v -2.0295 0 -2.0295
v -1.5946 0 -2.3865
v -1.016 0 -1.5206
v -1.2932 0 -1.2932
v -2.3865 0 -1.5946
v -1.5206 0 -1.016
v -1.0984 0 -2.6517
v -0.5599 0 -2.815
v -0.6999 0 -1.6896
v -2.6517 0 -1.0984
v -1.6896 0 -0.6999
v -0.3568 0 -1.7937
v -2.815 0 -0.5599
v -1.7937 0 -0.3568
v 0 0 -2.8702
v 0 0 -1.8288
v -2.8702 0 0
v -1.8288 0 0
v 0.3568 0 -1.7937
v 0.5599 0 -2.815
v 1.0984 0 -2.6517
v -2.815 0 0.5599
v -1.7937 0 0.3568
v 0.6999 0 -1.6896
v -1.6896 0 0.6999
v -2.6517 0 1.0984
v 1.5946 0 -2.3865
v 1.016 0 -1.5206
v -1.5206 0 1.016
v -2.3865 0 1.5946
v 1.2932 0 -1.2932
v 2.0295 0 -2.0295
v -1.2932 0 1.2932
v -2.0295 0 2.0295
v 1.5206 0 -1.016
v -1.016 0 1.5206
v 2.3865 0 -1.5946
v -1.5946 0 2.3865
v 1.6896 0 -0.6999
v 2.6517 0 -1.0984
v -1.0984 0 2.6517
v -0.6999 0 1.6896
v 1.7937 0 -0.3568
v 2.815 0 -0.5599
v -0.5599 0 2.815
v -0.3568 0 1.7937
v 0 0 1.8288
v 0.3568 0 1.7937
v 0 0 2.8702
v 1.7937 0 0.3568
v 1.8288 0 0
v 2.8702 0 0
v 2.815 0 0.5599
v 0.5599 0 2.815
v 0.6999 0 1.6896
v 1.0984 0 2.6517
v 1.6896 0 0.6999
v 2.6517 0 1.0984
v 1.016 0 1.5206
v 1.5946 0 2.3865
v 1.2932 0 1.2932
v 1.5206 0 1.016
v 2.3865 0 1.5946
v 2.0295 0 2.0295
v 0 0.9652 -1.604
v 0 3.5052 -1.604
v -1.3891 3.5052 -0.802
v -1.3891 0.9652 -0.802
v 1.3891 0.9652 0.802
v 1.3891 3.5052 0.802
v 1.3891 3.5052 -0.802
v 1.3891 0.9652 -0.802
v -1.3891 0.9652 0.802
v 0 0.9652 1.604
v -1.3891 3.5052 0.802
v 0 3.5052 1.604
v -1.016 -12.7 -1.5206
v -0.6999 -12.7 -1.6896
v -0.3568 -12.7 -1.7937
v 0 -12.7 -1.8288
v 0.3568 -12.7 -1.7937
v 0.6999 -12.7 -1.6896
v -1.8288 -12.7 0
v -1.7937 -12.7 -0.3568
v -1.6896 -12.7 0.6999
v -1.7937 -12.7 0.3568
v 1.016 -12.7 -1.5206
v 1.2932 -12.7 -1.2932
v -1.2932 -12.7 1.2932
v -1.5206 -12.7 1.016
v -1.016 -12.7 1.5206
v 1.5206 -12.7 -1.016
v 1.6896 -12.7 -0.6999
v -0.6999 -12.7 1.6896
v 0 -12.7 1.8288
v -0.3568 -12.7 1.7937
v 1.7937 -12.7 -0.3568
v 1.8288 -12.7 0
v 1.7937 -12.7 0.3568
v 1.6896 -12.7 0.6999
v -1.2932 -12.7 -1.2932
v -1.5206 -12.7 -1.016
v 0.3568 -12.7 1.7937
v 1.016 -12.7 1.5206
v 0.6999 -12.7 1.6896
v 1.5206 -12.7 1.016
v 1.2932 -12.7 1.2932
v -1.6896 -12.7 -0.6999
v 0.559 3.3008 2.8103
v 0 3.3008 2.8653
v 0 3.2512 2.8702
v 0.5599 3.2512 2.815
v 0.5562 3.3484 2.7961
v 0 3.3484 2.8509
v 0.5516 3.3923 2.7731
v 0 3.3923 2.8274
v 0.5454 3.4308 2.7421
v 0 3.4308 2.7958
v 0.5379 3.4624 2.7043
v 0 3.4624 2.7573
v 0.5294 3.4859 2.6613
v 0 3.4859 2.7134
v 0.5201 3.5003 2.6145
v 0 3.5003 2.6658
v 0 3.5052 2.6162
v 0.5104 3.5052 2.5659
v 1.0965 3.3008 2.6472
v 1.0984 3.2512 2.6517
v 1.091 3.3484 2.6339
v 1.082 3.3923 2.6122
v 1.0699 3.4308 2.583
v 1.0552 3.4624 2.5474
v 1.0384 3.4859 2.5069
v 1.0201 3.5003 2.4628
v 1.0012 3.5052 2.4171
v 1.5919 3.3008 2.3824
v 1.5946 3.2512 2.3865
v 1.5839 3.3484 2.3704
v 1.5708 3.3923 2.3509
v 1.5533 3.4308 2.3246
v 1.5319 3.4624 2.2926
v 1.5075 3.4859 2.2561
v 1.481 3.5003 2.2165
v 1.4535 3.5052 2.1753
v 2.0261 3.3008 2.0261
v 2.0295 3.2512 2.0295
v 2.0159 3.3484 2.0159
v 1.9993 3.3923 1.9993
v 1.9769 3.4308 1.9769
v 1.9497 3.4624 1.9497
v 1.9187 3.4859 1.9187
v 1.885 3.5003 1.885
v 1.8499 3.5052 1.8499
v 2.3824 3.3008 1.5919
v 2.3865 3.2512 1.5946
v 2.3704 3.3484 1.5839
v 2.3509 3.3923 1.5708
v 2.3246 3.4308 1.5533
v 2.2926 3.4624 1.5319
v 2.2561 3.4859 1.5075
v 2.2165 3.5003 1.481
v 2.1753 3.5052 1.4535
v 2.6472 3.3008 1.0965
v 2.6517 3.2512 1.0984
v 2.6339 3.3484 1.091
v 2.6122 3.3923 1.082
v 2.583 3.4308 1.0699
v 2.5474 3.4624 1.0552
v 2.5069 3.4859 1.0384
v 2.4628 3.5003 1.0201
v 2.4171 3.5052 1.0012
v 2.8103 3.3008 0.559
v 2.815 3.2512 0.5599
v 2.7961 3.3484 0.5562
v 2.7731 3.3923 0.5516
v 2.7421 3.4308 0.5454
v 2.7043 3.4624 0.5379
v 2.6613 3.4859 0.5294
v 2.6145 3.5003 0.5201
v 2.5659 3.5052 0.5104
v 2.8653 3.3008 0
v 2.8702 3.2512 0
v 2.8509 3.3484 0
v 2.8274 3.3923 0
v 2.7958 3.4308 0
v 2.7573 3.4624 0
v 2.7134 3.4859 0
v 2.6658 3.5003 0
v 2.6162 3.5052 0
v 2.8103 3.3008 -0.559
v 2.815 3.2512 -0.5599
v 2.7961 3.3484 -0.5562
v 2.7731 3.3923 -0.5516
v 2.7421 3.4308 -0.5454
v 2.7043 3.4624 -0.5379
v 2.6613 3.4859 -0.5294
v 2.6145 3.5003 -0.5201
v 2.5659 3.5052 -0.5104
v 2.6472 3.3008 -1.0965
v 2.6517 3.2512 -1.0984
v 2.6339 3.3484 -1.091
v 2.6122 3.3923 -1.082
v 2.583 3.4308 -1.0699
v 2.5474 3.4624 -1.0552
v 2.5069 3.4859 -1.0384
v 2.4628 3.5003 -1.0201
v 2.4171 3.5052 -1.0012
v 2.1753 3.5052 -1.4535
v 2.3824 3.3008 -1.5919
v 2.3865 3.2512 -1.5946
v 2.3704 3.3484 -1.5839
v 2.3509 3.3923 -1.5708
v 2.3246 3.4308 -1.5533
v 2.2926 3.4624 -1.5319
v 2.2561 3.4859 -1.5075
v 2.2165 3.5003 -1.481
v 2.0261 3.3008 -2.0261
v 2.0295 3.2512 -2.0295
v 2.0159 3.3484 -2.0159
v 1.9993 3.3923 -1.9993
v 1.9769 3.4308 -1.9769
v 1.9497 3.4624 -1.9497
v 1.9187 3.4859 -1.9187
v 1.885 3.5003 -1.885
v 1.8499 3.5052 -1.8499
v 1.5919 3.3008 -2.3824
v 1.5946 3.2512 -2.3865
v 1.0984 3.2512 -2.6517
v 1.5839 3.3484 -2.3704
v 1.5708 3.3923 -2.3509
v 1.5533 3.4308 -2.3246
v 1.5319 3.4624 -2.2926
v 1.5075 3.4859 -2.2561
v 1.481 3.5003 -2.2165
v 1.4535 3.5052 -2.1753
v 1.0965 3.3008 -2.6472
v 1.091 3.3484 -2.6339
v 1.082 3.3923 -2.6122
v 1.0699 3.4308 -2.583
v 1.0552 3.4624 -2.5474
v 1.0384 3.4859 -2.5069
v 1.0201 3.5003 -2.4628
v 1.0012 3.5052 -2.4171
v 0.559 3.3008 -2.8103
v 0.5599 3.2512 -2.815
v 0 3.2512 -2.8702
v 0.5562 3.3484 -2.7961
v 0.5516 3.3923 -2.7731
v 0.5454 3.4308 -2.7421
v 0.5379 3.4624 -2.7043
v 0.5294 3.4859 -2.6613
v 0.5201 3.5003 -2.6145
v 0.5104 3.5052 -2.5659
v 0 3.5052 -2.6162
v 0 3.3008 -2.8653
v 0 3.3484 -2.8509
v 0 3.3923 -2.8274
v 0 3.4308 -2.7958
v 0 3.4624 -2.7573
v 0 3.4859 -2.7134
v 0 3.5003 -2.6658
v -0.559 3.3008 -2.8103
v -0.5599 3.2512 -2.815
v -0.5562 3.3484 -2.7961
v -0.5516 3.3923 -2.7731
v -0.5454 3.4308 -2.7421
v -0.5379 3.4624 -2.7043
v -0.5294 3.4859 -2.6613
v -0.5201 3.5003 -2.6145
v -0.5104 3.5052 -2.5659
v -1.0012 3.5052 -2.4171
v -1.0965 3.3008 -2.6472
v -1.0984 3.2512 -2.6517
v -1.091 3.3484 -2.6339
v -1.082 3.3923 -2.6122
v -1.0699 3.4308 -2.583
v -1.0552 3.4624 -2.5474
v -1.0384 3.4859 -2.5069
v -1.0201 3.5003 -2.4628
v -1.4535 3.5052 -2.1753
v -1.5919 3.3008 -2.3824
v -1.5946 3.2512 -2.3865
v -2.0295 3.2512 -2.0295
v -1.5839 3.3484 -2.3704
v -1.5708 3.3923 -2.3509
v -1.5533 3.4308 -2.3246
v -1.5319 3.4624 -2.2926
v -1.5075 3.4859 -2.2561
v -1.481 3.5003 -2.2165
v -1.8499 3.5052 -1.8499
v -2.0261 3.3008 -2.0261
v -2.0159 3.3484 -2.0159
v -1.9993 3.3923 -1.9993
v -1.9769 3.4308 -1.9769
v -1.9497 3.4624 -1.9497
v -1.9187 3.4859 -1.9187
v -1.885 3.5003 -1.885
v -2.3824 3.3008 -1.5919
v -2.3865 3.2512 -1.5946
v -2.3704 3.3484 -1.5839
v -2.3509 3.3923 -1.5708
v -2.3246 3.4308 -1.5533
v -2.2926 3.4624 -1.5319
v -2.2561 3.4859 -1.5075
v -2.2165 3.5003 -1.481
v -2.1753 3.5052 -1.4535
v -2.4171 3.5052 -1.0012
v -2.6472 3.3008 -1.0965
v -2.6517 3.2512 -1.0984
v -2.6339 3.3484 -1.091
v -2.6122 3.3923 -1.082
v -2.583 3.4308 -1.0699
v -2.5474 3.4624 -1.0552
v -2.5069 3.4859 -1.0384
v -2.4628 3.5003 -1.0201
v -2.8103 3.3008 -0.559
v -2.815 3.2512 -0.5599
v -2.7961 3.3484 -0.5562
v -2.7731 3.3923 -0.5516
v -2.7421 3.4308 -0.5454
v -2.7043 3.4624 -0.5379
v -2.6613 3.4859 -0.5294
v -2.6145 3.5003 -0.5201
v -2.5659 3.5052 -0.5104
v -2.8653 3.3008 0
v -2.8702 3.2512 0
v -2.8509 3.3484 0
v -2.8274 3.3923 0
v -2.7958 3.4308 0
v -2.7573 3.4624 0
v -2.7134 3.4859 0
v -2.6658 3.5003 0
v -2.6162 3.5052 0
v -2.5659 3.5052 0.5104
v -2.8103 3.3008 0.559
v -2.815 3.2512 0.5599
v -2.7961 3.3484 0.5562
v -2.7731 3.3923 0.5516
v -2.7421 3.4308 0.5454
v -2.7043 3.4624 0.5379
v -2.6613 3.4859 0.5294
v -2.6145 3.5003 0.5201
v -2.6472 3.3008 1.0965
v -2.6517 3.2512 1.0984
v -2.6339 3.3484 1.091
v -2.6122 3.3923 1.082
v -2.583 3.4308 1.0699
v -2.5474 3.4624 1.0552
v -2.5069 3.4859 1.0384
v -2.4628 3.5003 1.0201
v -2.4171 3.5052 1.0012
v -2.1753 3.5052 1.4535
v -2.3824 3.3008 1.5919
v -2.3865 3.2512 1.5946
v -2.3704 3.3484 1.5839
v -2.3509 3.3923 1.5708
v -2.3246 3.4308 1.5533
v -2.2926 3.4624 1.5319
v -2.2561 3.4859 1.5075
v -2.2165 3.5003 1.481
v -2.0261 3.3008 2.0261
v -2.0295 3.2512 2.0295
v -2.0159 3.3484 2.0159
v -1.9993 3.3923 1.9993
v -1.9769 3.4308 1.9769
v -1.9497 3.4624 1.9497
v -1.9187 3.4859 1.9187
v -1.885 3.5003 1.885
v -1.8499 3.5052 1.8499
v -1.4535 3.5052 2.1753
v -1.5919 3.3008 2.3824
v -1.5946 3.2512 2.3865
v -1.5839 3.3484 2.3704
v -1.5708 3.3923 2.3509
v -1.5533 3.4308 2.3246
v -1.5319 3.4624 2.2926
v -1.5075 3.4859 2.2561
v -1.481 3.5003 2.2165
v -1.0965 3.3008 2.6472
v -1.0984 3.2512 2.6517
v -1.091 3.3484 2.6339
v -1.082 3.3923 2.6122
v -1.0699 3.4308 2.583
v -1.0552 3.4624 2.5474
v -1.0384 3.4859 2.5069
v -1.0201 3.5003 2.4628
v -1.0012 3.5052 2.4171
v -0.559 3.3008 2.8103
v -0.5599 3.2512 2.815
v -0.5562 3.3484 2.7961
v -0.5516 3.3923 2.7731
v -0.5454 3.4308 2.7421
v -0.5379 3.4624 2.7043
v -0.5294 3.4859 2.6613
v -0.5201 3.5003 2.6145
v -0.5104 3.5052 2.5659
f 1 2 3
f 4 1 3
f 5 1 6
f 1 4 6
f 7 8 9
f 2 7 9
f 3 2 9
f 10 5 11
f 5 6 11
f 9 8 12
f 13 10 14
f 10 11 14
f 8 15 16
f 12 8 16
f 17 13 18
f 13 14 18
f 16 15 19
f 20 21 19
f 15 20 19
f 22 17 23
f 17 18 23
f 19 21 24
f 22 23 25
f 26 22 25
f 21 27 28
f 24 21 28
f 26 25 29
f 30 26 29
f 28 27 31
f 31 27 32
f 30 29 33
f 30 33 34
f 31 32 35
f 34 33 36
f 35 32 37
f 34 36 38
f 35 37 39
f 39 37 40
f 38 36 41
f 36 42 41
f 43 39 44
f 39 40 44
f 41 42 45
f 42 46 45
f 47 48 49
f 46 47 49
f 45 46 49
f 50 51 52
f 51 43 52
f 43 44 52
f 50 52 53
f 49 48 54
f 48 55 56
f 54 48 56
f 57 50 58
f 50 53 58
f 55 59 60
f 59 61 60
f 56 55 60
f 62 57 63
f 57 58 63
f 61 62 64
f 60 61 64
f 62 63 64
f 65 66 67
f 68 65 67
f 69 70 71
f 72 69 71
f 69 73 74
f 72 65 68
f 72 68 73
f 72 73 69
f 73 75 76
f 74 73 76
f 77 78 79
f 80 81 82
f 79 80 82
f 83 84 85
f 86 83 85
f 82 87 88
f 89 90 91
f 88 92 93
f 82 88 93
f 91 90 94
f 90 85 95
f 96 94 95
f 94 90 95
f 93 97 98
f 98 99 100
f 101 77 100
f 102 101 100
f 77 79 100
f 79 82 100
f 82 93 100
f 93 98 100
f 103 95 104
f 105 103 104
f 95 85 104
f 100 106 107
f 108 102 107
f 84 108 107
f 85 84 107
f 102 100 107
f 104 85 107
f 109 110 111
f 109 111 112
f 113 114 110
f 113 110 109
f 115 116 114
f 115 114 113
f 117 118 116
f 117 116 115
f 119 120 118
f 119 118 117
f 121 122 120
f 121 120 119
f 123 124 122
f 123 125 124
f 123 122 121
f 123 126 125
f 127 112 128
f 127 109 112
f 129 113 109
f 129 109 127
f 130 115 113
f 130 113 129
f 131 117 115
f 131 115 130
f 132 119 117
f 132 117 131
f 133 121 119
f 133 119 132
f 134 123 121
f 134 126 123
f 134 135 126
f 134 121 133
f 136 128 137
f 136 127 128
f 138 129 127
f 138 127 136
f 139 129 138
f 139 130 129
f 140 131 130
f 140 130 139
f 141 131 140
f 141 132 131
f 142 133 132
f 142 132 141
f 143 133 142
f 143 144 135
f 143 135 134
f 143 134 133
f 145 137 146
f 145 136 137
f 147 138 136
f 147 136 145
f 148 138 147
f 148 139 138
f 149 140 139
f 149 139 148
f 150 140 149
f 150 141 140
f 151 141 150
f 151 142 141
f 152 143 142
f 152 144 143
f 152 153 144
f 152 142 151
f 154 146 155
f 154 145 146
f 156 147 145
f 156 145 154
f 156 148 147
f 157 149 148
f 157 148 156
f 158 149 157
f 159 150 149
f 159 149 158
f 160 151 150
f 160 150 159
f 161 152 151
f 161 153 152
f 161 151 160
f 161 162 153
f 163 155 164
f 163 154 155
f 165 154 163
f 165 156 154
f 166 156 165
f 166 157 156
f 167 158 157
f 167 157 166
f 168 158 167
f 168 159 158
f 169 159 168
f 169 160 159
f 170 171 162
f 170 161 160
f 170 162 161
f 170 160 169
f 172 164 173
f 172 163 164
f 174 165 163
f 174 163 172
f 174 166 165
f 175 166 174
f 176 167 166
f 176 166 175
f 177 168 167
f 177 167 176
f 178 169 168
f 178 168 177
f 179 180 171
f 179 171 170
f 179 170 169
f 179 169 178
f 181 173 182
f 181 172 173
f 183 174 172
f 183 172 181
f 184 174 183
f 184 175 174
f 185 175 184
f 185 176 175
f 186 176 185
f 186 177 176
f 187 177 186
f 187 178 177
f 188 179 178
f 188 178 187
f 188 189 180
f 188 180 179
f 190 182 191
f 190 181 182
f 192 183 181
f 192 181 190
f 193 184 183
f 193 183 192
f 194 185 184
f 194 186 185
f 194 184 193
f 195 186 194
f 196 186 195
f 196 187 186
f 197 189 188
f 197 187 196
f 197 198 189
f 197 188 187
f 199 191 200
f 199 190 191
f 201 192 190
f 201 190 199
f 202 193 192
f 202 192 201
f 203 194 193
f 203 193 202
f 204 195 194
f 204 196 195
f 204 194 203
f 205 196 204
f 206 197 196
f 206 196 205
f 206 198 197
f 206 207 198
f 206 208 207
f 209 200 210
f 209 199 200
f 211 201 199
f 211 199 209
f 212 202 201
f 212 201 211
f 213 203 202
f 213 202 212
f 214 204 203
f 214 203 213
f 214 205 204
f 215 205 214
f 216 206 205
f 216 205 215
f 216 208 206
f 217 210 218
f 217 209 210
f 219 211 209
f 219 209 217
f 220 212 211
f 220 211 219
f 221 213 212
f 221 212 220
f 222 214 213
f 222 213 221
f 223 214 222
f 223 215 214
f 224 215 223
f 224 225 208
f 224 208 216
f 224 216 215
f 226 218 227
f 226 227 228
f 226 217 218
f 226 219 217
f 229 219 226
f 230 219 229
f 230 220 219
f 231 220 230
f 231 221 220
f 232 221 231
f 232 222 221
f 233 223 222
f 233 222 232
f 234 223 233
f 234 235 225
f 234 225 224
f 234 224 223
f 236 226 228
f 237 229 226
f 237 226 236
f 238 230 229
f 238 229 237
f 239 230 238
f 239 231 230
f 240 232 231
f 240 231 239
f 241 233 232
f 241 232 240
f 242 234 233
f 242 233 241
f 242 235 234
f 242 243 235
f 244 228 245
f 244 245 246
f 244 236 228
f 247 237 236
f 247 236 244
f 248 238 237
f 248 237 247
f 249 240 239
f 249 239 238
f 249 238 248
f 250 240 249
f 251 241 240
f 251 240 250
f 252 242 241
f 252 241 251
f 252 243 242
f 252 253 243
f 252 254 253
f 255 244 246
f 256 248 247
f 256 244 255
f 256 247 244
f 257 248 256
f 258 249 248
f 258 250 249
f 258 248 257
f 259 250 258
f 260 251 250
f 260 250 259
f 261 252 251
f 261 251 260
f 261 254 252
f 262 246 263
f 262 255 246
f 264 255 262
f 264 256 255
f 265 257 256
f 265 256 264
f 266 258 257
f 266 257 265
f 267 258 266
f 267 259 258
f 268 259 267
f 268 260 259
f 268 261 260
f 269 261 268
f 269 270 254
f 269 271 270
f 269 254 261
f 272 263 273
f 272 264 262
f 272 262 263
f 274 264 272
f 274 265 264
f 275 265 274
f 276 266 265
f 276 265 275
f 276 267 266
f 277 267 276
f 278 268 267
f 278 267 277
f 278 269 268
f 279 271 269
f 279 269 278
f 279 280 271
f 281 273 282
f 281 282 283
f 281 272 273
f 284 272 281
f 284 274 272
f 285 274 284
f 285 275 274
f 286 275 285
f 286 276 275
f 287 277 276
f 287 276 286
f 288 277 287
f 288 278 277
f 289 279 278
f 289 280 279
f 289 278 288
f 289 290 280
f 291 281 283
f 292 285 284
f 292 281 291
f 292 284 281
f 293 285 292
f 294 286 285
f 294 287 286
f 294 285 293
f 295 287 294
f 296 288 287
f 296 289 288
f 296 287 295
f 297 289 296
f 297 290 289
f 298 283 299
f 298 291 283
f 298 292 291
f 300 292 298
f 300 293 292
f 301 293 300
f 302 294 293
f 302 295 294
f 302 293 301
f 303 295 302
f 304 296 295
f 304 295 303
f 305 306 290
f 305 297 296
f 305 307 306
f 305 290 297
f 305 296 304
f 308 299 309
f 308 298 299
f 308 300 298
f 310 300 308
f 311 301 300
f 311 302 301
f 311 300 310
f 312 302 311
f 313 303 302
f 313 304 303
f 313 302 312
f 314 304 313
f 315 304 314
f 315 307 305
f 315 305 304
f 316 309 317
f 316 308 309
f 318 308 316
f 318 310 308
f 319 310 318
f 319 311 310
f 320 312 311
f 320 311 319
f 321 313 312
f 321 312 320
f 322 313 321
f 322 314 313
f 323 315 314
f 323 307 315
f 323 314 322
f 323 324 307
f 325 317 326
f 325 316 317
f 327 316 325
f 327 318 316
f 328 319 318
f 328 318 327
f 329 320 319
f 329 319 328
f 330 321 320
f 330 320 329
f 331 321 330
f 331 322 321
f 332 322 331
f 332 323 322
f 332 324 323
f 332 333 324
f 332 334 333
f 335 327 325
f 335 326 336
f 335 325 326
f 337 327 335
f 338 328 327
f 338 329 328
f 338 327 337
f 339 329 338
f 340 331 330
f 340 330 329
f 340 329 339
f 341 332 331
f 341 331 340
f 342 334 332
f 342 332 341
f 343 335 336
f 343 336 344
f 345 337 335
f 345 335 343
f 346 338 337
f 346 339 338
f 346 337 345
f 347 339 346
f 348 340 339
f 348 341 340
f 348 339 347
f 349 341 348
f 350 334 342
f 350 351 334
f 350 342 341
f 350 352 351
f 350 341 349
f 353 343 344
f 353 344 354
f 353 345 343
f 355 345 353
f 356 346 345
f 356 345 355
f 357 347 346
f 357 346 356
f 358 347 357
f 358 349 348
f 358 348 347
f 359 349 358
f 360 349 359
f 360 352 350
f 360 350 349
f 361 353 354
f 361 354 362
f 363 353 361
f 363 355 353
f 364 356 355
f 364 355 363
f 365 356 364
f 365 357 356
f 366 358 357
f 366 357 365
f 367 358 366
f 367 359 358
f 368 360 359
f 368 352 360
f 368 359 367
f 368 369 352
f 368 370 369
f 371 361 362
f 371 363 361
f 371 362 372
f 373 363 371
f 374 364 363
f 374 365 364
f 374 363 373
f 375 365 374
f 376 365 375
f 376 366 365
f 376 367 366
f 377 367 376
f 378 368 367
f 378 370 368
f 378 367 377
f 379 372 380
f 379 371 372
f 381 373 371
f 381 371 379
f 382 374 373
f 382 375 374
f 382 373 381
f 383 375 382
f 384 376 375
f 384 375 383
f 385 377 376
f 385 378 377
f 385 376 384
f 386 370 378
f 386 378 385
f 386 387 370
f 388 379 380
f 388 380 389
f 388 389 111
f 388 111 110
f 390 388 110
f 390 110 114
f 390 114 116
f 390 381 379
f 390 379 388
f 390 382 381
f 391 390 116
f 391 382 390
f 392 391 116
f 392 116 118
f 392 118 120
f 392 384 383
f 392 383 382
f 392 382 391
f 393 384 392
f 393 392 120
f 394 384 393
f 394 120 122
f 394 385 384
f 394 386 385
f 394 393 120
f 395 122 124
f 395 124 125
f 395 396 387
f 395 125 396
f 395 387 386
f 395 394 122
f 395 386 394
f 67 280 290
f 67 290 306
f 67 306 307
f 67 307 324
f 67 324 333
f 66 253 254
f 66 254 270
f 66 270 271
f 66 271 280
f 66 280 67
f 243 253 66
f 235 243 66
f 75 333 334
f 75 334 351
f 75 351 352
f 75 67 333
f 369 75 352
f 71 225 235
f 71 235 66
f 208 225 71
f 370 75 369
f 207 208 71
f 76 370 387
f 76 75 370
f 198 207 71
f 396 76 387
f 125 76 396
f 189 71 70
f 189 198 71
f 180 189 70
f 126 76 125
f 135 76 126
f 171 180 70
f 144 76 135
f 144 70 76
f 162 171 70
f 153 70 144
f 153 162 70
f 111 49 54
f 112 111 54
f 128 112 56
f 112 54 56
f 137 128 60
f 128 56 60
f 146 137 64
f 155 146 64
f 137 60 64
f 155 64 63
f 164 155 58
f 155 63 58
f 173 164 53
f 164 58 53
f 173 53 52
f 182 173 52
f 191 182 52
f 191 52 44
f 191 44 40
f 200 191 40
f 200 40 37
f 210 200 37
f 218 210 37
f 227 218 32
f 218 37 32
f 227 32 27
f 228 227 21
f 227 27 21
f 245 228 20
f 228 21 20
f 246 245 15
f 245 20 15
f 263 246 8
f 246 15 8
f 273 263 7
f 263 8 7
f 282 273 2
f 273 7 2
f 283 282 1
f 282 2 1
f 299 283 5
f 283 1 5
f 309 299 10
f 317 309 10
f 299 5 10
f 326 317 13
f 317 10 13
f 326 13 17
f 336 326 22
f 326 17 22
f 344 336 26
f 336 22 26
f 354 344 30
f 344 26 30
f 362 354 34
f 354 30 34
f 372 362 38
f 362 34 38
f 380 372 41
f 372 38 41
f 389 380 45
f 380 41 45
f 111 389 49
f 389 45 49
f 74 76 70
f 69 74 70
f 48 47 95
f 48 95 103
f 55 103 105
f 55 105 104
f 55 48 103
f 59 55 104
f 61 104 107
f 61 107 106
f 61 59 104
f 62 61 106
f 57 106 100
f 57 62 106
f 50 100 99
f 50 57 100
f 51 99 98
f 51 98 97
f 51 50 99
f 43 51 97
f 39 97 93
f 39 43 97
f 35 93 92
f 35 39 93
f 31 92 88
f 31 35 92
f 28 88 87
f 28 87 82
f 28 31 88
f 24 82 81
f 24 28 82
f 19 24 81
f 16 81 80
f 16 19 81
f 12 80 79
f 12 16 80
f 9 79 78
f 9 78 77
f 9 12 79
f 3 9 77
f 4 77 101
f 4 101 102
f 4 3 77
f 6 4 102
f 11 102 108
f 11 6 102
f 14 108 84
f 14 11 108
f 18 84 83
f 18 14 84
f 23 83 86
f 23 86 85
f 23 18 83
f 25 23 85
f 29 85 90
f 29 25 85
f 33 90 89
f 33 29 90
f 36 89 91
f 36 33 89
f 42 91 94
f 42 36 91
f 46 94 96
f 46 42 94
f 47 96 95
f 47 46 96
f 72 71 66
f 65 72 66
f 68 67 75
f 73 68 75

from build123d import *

# Parameters (mm, degrees)
SKETCH1_R           = 1.8288
BOSS_EXTRUDE1_DEPTH = 12.7
SKETCH2_R           = 2.8702
BOSS_EXTRUDE2_DEPTH = 3.5052
FILLET1_R           = 0.254
CUT_EXTRUDE1_DEPTH  = 2.54


with BuildPart() as part:
    # Sketch1 → Boss-Extrude1 (new body)
    with BuildSketch(Plane(origin=(0, 0, 0), x_dir=(1, 0, 0), z_dir=(0, 1, 0))):
        with Locations(Location((0, 0, 0), (0, 0, 270))):
            Circle(SKETCH1_R)
    extrude(amount=-BOSS_EXTRUDE1_DEPTH)

    # Sketch2 → Boss-Extrude2 (add)
    with BuildSketch(Plane(origin=(0, 0, 0), x_dir=(1, 0, 0), z_dir=(0, 1, 0))):
        with Locations(Location((0, 0, 0), (0, 0, 270))):
            Circle(SKETCH2_R)
    extrude(amount=BOSS_EXTRUDE2_DEPTH)

    # Fillet1
    fillet1_edges = [part.edges().sort_by_distance(p)[0] for p in [
        (0, 3.5052, -2.8702),
    ]]
    fillet(fillet1_edges, radius=FILLET1_R)

    # Sketch3 → Cut-Extrude1 (cut)
    with BuildSketch(Plane(origin=(0, 3.5052, 0), x_dir=(1, 0, 0), z_dir=(0, 1, 0))):
        Polygon((0, 1.603951217), (-1.3890625, 0.801975608), (-1.3890625, -0.801975608), (0, -1.603951217), (1.3890625, -0.801975608), (1.3890625, 0.801975608), align=None)
    extrude(amount=-CUT_EXTRUDE1_DEPTH, mode=Mode.SUBTRACT)


solid = part.part
